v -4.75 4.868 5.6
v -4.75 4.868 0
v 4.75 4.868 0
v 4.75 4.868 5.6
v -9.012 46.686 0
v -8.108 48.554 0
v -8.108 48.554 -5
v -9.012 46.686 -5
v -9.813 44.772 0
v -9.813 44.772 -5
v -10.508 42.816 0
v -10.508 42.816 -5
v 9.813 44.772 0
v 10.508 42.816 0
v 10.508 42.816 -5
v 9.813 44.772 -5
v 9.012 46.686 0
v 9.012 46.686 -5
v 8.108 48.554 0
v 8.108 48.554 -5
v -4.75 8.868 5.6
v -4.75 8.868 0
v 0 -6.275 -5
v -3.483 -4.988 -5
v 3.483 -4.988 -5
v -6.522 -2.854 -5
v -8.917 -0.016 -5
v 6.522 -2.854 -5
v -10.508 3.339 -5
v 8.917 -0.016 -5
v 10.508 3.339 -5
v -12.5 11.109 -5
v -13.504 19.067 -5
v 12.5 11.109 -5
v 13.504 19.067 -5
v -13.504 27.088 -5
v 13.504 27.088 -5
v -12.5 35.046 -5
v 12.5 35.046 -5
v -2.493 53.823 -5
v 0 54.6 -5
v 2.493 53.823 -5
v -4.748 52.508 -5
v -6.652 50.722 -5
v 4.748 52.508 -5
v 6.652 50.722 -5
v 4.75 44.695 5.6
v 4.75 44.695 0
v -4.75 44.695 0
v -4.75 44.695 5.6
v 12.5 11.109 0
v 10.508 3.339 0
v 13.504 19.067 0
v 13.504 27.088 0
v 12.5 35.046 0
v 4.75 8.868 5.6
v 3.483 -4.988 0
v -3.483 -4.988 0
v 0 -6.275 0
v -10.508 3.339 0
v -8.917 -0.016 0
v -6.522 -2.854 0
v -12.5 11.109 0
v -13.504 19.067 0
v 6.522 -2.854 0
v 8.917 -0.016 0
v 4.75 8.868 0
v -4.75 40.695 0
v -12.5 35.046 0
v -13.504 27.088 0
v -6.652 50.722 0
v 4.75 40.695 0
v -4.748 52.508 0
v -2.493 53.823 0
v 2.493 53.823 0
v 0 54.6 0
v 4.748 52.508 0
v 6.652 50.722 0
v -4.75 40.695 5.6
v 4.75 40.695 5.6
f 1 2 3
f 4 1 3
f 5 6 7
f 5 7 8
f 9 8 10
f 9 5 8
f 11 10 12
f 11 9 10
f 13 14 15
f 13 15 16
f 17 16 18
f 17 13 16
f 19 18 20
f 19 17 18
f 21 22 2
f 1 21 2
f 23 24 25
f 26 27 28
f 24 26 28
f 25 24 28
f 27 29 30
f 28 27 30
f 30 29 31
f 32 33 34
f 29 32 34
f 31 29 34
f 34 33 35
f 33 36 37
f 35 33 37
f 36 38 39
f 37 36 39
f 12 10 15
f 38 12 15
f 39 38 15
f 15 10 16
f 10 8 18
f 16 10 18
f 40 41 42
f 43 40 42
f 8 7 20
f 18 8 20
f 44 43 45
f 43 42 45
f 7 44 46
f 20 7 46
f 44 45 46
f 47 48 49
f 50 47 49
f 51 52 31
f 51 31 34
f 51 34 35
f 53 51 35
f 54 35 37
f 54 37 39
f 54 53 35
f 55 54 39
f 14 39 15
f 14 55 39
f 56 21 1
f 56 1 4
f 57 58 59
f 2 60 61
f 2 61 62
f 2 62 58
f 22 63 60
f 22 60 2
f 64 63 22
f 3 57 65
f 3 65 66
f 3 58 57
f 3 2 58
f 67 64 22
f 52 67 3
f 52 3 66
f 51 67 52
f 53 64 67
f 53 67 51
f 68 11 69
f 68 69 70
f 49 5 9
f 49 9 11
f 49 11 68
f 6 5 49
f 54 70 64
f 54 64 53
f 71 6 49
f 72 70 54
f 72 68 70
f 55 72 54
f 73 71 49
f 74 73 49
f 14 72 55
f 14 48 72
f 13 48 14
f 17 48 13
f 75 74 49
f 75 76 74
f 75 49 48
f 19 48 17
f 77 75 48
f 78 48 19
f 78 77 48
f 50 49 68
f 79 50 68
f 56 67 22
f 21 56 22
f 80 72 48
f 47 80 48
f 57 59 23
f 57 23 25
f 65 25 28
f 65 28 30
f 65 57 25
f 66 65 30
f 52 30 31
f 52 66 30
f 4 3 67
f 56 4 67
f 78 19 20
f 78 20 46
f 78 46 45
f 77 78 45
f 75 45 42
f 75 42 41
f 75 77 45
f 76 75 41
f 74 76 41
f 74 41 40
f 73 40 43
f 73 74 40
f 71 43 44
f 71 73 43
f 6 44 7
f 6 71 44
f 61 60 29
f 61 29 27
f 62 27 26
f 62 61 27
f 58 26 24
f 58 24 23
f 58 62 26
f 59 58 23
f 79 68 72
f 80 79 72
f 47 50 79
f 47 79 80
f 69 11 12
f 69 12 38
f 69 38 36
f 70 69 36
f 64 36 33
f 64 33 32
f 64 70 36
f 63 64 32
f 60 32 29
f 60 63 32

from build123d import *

# Parameters (mm, degrees)
F1_DEPTH = 5
F3_DEPTH = 5.6


with BuildPart() as f1:
    # F0 (on Top) → F1 (new body)
    with BuildSketch(Plane.XY):
        with BuildLine():
            ThreePointArc((10.507595, 42.815993), (9.425797, 45.734413), (8.107674, 48.55399))
            ThreePointArc((8.107674, 48.55399), (4.748236, 52.508255), (0, 54.600213))
            ThreePointArc((0, 54.600213), (-4.748236, 52.508255), (-8.107674, 48.55399))
            ThreePointArc((-8.107674, 48.55399), (-9.425797, 45.734413), (-10.507595, 42.815993))
            ThreePointArc((-10.507595, 42.815993), (-13.630387, 23.077428), (-10.507595, 3.338862))
            ThreePointArc((-10.507595, 3.338862), (-6.522182, -2.854452), (0, -6.275239))
            ThreePointArc((0, -6.275239), (6.522182, -2.854452), (10.507595, 3.338862))
            ThreePointArc((10.507595, 3.338862), (13.630387, 23.077428), (10.507595, 42.815993))
        make_face()
    extrude(amount=-F1_DEPTH)

    # F2 (on Top) → F3 (join)
    with BuildSketch(Plane.XY):
        Polygon((4.75, 8.868314), (0, 8.868314), (-4.75, 8.868314), (-4.75, 4.868314), (0, 4.868314), (4.75, 4.868314), align=None)
        Polygon((4.75, 44.695161), (0, 44.695161), (-4.75, 44.695161), (-4.75, 40.695161), (0, 40.695161), (4.75, 40.695161), align=None)
    extrude(amount=F3_DEPTH)


solid = f1.part
